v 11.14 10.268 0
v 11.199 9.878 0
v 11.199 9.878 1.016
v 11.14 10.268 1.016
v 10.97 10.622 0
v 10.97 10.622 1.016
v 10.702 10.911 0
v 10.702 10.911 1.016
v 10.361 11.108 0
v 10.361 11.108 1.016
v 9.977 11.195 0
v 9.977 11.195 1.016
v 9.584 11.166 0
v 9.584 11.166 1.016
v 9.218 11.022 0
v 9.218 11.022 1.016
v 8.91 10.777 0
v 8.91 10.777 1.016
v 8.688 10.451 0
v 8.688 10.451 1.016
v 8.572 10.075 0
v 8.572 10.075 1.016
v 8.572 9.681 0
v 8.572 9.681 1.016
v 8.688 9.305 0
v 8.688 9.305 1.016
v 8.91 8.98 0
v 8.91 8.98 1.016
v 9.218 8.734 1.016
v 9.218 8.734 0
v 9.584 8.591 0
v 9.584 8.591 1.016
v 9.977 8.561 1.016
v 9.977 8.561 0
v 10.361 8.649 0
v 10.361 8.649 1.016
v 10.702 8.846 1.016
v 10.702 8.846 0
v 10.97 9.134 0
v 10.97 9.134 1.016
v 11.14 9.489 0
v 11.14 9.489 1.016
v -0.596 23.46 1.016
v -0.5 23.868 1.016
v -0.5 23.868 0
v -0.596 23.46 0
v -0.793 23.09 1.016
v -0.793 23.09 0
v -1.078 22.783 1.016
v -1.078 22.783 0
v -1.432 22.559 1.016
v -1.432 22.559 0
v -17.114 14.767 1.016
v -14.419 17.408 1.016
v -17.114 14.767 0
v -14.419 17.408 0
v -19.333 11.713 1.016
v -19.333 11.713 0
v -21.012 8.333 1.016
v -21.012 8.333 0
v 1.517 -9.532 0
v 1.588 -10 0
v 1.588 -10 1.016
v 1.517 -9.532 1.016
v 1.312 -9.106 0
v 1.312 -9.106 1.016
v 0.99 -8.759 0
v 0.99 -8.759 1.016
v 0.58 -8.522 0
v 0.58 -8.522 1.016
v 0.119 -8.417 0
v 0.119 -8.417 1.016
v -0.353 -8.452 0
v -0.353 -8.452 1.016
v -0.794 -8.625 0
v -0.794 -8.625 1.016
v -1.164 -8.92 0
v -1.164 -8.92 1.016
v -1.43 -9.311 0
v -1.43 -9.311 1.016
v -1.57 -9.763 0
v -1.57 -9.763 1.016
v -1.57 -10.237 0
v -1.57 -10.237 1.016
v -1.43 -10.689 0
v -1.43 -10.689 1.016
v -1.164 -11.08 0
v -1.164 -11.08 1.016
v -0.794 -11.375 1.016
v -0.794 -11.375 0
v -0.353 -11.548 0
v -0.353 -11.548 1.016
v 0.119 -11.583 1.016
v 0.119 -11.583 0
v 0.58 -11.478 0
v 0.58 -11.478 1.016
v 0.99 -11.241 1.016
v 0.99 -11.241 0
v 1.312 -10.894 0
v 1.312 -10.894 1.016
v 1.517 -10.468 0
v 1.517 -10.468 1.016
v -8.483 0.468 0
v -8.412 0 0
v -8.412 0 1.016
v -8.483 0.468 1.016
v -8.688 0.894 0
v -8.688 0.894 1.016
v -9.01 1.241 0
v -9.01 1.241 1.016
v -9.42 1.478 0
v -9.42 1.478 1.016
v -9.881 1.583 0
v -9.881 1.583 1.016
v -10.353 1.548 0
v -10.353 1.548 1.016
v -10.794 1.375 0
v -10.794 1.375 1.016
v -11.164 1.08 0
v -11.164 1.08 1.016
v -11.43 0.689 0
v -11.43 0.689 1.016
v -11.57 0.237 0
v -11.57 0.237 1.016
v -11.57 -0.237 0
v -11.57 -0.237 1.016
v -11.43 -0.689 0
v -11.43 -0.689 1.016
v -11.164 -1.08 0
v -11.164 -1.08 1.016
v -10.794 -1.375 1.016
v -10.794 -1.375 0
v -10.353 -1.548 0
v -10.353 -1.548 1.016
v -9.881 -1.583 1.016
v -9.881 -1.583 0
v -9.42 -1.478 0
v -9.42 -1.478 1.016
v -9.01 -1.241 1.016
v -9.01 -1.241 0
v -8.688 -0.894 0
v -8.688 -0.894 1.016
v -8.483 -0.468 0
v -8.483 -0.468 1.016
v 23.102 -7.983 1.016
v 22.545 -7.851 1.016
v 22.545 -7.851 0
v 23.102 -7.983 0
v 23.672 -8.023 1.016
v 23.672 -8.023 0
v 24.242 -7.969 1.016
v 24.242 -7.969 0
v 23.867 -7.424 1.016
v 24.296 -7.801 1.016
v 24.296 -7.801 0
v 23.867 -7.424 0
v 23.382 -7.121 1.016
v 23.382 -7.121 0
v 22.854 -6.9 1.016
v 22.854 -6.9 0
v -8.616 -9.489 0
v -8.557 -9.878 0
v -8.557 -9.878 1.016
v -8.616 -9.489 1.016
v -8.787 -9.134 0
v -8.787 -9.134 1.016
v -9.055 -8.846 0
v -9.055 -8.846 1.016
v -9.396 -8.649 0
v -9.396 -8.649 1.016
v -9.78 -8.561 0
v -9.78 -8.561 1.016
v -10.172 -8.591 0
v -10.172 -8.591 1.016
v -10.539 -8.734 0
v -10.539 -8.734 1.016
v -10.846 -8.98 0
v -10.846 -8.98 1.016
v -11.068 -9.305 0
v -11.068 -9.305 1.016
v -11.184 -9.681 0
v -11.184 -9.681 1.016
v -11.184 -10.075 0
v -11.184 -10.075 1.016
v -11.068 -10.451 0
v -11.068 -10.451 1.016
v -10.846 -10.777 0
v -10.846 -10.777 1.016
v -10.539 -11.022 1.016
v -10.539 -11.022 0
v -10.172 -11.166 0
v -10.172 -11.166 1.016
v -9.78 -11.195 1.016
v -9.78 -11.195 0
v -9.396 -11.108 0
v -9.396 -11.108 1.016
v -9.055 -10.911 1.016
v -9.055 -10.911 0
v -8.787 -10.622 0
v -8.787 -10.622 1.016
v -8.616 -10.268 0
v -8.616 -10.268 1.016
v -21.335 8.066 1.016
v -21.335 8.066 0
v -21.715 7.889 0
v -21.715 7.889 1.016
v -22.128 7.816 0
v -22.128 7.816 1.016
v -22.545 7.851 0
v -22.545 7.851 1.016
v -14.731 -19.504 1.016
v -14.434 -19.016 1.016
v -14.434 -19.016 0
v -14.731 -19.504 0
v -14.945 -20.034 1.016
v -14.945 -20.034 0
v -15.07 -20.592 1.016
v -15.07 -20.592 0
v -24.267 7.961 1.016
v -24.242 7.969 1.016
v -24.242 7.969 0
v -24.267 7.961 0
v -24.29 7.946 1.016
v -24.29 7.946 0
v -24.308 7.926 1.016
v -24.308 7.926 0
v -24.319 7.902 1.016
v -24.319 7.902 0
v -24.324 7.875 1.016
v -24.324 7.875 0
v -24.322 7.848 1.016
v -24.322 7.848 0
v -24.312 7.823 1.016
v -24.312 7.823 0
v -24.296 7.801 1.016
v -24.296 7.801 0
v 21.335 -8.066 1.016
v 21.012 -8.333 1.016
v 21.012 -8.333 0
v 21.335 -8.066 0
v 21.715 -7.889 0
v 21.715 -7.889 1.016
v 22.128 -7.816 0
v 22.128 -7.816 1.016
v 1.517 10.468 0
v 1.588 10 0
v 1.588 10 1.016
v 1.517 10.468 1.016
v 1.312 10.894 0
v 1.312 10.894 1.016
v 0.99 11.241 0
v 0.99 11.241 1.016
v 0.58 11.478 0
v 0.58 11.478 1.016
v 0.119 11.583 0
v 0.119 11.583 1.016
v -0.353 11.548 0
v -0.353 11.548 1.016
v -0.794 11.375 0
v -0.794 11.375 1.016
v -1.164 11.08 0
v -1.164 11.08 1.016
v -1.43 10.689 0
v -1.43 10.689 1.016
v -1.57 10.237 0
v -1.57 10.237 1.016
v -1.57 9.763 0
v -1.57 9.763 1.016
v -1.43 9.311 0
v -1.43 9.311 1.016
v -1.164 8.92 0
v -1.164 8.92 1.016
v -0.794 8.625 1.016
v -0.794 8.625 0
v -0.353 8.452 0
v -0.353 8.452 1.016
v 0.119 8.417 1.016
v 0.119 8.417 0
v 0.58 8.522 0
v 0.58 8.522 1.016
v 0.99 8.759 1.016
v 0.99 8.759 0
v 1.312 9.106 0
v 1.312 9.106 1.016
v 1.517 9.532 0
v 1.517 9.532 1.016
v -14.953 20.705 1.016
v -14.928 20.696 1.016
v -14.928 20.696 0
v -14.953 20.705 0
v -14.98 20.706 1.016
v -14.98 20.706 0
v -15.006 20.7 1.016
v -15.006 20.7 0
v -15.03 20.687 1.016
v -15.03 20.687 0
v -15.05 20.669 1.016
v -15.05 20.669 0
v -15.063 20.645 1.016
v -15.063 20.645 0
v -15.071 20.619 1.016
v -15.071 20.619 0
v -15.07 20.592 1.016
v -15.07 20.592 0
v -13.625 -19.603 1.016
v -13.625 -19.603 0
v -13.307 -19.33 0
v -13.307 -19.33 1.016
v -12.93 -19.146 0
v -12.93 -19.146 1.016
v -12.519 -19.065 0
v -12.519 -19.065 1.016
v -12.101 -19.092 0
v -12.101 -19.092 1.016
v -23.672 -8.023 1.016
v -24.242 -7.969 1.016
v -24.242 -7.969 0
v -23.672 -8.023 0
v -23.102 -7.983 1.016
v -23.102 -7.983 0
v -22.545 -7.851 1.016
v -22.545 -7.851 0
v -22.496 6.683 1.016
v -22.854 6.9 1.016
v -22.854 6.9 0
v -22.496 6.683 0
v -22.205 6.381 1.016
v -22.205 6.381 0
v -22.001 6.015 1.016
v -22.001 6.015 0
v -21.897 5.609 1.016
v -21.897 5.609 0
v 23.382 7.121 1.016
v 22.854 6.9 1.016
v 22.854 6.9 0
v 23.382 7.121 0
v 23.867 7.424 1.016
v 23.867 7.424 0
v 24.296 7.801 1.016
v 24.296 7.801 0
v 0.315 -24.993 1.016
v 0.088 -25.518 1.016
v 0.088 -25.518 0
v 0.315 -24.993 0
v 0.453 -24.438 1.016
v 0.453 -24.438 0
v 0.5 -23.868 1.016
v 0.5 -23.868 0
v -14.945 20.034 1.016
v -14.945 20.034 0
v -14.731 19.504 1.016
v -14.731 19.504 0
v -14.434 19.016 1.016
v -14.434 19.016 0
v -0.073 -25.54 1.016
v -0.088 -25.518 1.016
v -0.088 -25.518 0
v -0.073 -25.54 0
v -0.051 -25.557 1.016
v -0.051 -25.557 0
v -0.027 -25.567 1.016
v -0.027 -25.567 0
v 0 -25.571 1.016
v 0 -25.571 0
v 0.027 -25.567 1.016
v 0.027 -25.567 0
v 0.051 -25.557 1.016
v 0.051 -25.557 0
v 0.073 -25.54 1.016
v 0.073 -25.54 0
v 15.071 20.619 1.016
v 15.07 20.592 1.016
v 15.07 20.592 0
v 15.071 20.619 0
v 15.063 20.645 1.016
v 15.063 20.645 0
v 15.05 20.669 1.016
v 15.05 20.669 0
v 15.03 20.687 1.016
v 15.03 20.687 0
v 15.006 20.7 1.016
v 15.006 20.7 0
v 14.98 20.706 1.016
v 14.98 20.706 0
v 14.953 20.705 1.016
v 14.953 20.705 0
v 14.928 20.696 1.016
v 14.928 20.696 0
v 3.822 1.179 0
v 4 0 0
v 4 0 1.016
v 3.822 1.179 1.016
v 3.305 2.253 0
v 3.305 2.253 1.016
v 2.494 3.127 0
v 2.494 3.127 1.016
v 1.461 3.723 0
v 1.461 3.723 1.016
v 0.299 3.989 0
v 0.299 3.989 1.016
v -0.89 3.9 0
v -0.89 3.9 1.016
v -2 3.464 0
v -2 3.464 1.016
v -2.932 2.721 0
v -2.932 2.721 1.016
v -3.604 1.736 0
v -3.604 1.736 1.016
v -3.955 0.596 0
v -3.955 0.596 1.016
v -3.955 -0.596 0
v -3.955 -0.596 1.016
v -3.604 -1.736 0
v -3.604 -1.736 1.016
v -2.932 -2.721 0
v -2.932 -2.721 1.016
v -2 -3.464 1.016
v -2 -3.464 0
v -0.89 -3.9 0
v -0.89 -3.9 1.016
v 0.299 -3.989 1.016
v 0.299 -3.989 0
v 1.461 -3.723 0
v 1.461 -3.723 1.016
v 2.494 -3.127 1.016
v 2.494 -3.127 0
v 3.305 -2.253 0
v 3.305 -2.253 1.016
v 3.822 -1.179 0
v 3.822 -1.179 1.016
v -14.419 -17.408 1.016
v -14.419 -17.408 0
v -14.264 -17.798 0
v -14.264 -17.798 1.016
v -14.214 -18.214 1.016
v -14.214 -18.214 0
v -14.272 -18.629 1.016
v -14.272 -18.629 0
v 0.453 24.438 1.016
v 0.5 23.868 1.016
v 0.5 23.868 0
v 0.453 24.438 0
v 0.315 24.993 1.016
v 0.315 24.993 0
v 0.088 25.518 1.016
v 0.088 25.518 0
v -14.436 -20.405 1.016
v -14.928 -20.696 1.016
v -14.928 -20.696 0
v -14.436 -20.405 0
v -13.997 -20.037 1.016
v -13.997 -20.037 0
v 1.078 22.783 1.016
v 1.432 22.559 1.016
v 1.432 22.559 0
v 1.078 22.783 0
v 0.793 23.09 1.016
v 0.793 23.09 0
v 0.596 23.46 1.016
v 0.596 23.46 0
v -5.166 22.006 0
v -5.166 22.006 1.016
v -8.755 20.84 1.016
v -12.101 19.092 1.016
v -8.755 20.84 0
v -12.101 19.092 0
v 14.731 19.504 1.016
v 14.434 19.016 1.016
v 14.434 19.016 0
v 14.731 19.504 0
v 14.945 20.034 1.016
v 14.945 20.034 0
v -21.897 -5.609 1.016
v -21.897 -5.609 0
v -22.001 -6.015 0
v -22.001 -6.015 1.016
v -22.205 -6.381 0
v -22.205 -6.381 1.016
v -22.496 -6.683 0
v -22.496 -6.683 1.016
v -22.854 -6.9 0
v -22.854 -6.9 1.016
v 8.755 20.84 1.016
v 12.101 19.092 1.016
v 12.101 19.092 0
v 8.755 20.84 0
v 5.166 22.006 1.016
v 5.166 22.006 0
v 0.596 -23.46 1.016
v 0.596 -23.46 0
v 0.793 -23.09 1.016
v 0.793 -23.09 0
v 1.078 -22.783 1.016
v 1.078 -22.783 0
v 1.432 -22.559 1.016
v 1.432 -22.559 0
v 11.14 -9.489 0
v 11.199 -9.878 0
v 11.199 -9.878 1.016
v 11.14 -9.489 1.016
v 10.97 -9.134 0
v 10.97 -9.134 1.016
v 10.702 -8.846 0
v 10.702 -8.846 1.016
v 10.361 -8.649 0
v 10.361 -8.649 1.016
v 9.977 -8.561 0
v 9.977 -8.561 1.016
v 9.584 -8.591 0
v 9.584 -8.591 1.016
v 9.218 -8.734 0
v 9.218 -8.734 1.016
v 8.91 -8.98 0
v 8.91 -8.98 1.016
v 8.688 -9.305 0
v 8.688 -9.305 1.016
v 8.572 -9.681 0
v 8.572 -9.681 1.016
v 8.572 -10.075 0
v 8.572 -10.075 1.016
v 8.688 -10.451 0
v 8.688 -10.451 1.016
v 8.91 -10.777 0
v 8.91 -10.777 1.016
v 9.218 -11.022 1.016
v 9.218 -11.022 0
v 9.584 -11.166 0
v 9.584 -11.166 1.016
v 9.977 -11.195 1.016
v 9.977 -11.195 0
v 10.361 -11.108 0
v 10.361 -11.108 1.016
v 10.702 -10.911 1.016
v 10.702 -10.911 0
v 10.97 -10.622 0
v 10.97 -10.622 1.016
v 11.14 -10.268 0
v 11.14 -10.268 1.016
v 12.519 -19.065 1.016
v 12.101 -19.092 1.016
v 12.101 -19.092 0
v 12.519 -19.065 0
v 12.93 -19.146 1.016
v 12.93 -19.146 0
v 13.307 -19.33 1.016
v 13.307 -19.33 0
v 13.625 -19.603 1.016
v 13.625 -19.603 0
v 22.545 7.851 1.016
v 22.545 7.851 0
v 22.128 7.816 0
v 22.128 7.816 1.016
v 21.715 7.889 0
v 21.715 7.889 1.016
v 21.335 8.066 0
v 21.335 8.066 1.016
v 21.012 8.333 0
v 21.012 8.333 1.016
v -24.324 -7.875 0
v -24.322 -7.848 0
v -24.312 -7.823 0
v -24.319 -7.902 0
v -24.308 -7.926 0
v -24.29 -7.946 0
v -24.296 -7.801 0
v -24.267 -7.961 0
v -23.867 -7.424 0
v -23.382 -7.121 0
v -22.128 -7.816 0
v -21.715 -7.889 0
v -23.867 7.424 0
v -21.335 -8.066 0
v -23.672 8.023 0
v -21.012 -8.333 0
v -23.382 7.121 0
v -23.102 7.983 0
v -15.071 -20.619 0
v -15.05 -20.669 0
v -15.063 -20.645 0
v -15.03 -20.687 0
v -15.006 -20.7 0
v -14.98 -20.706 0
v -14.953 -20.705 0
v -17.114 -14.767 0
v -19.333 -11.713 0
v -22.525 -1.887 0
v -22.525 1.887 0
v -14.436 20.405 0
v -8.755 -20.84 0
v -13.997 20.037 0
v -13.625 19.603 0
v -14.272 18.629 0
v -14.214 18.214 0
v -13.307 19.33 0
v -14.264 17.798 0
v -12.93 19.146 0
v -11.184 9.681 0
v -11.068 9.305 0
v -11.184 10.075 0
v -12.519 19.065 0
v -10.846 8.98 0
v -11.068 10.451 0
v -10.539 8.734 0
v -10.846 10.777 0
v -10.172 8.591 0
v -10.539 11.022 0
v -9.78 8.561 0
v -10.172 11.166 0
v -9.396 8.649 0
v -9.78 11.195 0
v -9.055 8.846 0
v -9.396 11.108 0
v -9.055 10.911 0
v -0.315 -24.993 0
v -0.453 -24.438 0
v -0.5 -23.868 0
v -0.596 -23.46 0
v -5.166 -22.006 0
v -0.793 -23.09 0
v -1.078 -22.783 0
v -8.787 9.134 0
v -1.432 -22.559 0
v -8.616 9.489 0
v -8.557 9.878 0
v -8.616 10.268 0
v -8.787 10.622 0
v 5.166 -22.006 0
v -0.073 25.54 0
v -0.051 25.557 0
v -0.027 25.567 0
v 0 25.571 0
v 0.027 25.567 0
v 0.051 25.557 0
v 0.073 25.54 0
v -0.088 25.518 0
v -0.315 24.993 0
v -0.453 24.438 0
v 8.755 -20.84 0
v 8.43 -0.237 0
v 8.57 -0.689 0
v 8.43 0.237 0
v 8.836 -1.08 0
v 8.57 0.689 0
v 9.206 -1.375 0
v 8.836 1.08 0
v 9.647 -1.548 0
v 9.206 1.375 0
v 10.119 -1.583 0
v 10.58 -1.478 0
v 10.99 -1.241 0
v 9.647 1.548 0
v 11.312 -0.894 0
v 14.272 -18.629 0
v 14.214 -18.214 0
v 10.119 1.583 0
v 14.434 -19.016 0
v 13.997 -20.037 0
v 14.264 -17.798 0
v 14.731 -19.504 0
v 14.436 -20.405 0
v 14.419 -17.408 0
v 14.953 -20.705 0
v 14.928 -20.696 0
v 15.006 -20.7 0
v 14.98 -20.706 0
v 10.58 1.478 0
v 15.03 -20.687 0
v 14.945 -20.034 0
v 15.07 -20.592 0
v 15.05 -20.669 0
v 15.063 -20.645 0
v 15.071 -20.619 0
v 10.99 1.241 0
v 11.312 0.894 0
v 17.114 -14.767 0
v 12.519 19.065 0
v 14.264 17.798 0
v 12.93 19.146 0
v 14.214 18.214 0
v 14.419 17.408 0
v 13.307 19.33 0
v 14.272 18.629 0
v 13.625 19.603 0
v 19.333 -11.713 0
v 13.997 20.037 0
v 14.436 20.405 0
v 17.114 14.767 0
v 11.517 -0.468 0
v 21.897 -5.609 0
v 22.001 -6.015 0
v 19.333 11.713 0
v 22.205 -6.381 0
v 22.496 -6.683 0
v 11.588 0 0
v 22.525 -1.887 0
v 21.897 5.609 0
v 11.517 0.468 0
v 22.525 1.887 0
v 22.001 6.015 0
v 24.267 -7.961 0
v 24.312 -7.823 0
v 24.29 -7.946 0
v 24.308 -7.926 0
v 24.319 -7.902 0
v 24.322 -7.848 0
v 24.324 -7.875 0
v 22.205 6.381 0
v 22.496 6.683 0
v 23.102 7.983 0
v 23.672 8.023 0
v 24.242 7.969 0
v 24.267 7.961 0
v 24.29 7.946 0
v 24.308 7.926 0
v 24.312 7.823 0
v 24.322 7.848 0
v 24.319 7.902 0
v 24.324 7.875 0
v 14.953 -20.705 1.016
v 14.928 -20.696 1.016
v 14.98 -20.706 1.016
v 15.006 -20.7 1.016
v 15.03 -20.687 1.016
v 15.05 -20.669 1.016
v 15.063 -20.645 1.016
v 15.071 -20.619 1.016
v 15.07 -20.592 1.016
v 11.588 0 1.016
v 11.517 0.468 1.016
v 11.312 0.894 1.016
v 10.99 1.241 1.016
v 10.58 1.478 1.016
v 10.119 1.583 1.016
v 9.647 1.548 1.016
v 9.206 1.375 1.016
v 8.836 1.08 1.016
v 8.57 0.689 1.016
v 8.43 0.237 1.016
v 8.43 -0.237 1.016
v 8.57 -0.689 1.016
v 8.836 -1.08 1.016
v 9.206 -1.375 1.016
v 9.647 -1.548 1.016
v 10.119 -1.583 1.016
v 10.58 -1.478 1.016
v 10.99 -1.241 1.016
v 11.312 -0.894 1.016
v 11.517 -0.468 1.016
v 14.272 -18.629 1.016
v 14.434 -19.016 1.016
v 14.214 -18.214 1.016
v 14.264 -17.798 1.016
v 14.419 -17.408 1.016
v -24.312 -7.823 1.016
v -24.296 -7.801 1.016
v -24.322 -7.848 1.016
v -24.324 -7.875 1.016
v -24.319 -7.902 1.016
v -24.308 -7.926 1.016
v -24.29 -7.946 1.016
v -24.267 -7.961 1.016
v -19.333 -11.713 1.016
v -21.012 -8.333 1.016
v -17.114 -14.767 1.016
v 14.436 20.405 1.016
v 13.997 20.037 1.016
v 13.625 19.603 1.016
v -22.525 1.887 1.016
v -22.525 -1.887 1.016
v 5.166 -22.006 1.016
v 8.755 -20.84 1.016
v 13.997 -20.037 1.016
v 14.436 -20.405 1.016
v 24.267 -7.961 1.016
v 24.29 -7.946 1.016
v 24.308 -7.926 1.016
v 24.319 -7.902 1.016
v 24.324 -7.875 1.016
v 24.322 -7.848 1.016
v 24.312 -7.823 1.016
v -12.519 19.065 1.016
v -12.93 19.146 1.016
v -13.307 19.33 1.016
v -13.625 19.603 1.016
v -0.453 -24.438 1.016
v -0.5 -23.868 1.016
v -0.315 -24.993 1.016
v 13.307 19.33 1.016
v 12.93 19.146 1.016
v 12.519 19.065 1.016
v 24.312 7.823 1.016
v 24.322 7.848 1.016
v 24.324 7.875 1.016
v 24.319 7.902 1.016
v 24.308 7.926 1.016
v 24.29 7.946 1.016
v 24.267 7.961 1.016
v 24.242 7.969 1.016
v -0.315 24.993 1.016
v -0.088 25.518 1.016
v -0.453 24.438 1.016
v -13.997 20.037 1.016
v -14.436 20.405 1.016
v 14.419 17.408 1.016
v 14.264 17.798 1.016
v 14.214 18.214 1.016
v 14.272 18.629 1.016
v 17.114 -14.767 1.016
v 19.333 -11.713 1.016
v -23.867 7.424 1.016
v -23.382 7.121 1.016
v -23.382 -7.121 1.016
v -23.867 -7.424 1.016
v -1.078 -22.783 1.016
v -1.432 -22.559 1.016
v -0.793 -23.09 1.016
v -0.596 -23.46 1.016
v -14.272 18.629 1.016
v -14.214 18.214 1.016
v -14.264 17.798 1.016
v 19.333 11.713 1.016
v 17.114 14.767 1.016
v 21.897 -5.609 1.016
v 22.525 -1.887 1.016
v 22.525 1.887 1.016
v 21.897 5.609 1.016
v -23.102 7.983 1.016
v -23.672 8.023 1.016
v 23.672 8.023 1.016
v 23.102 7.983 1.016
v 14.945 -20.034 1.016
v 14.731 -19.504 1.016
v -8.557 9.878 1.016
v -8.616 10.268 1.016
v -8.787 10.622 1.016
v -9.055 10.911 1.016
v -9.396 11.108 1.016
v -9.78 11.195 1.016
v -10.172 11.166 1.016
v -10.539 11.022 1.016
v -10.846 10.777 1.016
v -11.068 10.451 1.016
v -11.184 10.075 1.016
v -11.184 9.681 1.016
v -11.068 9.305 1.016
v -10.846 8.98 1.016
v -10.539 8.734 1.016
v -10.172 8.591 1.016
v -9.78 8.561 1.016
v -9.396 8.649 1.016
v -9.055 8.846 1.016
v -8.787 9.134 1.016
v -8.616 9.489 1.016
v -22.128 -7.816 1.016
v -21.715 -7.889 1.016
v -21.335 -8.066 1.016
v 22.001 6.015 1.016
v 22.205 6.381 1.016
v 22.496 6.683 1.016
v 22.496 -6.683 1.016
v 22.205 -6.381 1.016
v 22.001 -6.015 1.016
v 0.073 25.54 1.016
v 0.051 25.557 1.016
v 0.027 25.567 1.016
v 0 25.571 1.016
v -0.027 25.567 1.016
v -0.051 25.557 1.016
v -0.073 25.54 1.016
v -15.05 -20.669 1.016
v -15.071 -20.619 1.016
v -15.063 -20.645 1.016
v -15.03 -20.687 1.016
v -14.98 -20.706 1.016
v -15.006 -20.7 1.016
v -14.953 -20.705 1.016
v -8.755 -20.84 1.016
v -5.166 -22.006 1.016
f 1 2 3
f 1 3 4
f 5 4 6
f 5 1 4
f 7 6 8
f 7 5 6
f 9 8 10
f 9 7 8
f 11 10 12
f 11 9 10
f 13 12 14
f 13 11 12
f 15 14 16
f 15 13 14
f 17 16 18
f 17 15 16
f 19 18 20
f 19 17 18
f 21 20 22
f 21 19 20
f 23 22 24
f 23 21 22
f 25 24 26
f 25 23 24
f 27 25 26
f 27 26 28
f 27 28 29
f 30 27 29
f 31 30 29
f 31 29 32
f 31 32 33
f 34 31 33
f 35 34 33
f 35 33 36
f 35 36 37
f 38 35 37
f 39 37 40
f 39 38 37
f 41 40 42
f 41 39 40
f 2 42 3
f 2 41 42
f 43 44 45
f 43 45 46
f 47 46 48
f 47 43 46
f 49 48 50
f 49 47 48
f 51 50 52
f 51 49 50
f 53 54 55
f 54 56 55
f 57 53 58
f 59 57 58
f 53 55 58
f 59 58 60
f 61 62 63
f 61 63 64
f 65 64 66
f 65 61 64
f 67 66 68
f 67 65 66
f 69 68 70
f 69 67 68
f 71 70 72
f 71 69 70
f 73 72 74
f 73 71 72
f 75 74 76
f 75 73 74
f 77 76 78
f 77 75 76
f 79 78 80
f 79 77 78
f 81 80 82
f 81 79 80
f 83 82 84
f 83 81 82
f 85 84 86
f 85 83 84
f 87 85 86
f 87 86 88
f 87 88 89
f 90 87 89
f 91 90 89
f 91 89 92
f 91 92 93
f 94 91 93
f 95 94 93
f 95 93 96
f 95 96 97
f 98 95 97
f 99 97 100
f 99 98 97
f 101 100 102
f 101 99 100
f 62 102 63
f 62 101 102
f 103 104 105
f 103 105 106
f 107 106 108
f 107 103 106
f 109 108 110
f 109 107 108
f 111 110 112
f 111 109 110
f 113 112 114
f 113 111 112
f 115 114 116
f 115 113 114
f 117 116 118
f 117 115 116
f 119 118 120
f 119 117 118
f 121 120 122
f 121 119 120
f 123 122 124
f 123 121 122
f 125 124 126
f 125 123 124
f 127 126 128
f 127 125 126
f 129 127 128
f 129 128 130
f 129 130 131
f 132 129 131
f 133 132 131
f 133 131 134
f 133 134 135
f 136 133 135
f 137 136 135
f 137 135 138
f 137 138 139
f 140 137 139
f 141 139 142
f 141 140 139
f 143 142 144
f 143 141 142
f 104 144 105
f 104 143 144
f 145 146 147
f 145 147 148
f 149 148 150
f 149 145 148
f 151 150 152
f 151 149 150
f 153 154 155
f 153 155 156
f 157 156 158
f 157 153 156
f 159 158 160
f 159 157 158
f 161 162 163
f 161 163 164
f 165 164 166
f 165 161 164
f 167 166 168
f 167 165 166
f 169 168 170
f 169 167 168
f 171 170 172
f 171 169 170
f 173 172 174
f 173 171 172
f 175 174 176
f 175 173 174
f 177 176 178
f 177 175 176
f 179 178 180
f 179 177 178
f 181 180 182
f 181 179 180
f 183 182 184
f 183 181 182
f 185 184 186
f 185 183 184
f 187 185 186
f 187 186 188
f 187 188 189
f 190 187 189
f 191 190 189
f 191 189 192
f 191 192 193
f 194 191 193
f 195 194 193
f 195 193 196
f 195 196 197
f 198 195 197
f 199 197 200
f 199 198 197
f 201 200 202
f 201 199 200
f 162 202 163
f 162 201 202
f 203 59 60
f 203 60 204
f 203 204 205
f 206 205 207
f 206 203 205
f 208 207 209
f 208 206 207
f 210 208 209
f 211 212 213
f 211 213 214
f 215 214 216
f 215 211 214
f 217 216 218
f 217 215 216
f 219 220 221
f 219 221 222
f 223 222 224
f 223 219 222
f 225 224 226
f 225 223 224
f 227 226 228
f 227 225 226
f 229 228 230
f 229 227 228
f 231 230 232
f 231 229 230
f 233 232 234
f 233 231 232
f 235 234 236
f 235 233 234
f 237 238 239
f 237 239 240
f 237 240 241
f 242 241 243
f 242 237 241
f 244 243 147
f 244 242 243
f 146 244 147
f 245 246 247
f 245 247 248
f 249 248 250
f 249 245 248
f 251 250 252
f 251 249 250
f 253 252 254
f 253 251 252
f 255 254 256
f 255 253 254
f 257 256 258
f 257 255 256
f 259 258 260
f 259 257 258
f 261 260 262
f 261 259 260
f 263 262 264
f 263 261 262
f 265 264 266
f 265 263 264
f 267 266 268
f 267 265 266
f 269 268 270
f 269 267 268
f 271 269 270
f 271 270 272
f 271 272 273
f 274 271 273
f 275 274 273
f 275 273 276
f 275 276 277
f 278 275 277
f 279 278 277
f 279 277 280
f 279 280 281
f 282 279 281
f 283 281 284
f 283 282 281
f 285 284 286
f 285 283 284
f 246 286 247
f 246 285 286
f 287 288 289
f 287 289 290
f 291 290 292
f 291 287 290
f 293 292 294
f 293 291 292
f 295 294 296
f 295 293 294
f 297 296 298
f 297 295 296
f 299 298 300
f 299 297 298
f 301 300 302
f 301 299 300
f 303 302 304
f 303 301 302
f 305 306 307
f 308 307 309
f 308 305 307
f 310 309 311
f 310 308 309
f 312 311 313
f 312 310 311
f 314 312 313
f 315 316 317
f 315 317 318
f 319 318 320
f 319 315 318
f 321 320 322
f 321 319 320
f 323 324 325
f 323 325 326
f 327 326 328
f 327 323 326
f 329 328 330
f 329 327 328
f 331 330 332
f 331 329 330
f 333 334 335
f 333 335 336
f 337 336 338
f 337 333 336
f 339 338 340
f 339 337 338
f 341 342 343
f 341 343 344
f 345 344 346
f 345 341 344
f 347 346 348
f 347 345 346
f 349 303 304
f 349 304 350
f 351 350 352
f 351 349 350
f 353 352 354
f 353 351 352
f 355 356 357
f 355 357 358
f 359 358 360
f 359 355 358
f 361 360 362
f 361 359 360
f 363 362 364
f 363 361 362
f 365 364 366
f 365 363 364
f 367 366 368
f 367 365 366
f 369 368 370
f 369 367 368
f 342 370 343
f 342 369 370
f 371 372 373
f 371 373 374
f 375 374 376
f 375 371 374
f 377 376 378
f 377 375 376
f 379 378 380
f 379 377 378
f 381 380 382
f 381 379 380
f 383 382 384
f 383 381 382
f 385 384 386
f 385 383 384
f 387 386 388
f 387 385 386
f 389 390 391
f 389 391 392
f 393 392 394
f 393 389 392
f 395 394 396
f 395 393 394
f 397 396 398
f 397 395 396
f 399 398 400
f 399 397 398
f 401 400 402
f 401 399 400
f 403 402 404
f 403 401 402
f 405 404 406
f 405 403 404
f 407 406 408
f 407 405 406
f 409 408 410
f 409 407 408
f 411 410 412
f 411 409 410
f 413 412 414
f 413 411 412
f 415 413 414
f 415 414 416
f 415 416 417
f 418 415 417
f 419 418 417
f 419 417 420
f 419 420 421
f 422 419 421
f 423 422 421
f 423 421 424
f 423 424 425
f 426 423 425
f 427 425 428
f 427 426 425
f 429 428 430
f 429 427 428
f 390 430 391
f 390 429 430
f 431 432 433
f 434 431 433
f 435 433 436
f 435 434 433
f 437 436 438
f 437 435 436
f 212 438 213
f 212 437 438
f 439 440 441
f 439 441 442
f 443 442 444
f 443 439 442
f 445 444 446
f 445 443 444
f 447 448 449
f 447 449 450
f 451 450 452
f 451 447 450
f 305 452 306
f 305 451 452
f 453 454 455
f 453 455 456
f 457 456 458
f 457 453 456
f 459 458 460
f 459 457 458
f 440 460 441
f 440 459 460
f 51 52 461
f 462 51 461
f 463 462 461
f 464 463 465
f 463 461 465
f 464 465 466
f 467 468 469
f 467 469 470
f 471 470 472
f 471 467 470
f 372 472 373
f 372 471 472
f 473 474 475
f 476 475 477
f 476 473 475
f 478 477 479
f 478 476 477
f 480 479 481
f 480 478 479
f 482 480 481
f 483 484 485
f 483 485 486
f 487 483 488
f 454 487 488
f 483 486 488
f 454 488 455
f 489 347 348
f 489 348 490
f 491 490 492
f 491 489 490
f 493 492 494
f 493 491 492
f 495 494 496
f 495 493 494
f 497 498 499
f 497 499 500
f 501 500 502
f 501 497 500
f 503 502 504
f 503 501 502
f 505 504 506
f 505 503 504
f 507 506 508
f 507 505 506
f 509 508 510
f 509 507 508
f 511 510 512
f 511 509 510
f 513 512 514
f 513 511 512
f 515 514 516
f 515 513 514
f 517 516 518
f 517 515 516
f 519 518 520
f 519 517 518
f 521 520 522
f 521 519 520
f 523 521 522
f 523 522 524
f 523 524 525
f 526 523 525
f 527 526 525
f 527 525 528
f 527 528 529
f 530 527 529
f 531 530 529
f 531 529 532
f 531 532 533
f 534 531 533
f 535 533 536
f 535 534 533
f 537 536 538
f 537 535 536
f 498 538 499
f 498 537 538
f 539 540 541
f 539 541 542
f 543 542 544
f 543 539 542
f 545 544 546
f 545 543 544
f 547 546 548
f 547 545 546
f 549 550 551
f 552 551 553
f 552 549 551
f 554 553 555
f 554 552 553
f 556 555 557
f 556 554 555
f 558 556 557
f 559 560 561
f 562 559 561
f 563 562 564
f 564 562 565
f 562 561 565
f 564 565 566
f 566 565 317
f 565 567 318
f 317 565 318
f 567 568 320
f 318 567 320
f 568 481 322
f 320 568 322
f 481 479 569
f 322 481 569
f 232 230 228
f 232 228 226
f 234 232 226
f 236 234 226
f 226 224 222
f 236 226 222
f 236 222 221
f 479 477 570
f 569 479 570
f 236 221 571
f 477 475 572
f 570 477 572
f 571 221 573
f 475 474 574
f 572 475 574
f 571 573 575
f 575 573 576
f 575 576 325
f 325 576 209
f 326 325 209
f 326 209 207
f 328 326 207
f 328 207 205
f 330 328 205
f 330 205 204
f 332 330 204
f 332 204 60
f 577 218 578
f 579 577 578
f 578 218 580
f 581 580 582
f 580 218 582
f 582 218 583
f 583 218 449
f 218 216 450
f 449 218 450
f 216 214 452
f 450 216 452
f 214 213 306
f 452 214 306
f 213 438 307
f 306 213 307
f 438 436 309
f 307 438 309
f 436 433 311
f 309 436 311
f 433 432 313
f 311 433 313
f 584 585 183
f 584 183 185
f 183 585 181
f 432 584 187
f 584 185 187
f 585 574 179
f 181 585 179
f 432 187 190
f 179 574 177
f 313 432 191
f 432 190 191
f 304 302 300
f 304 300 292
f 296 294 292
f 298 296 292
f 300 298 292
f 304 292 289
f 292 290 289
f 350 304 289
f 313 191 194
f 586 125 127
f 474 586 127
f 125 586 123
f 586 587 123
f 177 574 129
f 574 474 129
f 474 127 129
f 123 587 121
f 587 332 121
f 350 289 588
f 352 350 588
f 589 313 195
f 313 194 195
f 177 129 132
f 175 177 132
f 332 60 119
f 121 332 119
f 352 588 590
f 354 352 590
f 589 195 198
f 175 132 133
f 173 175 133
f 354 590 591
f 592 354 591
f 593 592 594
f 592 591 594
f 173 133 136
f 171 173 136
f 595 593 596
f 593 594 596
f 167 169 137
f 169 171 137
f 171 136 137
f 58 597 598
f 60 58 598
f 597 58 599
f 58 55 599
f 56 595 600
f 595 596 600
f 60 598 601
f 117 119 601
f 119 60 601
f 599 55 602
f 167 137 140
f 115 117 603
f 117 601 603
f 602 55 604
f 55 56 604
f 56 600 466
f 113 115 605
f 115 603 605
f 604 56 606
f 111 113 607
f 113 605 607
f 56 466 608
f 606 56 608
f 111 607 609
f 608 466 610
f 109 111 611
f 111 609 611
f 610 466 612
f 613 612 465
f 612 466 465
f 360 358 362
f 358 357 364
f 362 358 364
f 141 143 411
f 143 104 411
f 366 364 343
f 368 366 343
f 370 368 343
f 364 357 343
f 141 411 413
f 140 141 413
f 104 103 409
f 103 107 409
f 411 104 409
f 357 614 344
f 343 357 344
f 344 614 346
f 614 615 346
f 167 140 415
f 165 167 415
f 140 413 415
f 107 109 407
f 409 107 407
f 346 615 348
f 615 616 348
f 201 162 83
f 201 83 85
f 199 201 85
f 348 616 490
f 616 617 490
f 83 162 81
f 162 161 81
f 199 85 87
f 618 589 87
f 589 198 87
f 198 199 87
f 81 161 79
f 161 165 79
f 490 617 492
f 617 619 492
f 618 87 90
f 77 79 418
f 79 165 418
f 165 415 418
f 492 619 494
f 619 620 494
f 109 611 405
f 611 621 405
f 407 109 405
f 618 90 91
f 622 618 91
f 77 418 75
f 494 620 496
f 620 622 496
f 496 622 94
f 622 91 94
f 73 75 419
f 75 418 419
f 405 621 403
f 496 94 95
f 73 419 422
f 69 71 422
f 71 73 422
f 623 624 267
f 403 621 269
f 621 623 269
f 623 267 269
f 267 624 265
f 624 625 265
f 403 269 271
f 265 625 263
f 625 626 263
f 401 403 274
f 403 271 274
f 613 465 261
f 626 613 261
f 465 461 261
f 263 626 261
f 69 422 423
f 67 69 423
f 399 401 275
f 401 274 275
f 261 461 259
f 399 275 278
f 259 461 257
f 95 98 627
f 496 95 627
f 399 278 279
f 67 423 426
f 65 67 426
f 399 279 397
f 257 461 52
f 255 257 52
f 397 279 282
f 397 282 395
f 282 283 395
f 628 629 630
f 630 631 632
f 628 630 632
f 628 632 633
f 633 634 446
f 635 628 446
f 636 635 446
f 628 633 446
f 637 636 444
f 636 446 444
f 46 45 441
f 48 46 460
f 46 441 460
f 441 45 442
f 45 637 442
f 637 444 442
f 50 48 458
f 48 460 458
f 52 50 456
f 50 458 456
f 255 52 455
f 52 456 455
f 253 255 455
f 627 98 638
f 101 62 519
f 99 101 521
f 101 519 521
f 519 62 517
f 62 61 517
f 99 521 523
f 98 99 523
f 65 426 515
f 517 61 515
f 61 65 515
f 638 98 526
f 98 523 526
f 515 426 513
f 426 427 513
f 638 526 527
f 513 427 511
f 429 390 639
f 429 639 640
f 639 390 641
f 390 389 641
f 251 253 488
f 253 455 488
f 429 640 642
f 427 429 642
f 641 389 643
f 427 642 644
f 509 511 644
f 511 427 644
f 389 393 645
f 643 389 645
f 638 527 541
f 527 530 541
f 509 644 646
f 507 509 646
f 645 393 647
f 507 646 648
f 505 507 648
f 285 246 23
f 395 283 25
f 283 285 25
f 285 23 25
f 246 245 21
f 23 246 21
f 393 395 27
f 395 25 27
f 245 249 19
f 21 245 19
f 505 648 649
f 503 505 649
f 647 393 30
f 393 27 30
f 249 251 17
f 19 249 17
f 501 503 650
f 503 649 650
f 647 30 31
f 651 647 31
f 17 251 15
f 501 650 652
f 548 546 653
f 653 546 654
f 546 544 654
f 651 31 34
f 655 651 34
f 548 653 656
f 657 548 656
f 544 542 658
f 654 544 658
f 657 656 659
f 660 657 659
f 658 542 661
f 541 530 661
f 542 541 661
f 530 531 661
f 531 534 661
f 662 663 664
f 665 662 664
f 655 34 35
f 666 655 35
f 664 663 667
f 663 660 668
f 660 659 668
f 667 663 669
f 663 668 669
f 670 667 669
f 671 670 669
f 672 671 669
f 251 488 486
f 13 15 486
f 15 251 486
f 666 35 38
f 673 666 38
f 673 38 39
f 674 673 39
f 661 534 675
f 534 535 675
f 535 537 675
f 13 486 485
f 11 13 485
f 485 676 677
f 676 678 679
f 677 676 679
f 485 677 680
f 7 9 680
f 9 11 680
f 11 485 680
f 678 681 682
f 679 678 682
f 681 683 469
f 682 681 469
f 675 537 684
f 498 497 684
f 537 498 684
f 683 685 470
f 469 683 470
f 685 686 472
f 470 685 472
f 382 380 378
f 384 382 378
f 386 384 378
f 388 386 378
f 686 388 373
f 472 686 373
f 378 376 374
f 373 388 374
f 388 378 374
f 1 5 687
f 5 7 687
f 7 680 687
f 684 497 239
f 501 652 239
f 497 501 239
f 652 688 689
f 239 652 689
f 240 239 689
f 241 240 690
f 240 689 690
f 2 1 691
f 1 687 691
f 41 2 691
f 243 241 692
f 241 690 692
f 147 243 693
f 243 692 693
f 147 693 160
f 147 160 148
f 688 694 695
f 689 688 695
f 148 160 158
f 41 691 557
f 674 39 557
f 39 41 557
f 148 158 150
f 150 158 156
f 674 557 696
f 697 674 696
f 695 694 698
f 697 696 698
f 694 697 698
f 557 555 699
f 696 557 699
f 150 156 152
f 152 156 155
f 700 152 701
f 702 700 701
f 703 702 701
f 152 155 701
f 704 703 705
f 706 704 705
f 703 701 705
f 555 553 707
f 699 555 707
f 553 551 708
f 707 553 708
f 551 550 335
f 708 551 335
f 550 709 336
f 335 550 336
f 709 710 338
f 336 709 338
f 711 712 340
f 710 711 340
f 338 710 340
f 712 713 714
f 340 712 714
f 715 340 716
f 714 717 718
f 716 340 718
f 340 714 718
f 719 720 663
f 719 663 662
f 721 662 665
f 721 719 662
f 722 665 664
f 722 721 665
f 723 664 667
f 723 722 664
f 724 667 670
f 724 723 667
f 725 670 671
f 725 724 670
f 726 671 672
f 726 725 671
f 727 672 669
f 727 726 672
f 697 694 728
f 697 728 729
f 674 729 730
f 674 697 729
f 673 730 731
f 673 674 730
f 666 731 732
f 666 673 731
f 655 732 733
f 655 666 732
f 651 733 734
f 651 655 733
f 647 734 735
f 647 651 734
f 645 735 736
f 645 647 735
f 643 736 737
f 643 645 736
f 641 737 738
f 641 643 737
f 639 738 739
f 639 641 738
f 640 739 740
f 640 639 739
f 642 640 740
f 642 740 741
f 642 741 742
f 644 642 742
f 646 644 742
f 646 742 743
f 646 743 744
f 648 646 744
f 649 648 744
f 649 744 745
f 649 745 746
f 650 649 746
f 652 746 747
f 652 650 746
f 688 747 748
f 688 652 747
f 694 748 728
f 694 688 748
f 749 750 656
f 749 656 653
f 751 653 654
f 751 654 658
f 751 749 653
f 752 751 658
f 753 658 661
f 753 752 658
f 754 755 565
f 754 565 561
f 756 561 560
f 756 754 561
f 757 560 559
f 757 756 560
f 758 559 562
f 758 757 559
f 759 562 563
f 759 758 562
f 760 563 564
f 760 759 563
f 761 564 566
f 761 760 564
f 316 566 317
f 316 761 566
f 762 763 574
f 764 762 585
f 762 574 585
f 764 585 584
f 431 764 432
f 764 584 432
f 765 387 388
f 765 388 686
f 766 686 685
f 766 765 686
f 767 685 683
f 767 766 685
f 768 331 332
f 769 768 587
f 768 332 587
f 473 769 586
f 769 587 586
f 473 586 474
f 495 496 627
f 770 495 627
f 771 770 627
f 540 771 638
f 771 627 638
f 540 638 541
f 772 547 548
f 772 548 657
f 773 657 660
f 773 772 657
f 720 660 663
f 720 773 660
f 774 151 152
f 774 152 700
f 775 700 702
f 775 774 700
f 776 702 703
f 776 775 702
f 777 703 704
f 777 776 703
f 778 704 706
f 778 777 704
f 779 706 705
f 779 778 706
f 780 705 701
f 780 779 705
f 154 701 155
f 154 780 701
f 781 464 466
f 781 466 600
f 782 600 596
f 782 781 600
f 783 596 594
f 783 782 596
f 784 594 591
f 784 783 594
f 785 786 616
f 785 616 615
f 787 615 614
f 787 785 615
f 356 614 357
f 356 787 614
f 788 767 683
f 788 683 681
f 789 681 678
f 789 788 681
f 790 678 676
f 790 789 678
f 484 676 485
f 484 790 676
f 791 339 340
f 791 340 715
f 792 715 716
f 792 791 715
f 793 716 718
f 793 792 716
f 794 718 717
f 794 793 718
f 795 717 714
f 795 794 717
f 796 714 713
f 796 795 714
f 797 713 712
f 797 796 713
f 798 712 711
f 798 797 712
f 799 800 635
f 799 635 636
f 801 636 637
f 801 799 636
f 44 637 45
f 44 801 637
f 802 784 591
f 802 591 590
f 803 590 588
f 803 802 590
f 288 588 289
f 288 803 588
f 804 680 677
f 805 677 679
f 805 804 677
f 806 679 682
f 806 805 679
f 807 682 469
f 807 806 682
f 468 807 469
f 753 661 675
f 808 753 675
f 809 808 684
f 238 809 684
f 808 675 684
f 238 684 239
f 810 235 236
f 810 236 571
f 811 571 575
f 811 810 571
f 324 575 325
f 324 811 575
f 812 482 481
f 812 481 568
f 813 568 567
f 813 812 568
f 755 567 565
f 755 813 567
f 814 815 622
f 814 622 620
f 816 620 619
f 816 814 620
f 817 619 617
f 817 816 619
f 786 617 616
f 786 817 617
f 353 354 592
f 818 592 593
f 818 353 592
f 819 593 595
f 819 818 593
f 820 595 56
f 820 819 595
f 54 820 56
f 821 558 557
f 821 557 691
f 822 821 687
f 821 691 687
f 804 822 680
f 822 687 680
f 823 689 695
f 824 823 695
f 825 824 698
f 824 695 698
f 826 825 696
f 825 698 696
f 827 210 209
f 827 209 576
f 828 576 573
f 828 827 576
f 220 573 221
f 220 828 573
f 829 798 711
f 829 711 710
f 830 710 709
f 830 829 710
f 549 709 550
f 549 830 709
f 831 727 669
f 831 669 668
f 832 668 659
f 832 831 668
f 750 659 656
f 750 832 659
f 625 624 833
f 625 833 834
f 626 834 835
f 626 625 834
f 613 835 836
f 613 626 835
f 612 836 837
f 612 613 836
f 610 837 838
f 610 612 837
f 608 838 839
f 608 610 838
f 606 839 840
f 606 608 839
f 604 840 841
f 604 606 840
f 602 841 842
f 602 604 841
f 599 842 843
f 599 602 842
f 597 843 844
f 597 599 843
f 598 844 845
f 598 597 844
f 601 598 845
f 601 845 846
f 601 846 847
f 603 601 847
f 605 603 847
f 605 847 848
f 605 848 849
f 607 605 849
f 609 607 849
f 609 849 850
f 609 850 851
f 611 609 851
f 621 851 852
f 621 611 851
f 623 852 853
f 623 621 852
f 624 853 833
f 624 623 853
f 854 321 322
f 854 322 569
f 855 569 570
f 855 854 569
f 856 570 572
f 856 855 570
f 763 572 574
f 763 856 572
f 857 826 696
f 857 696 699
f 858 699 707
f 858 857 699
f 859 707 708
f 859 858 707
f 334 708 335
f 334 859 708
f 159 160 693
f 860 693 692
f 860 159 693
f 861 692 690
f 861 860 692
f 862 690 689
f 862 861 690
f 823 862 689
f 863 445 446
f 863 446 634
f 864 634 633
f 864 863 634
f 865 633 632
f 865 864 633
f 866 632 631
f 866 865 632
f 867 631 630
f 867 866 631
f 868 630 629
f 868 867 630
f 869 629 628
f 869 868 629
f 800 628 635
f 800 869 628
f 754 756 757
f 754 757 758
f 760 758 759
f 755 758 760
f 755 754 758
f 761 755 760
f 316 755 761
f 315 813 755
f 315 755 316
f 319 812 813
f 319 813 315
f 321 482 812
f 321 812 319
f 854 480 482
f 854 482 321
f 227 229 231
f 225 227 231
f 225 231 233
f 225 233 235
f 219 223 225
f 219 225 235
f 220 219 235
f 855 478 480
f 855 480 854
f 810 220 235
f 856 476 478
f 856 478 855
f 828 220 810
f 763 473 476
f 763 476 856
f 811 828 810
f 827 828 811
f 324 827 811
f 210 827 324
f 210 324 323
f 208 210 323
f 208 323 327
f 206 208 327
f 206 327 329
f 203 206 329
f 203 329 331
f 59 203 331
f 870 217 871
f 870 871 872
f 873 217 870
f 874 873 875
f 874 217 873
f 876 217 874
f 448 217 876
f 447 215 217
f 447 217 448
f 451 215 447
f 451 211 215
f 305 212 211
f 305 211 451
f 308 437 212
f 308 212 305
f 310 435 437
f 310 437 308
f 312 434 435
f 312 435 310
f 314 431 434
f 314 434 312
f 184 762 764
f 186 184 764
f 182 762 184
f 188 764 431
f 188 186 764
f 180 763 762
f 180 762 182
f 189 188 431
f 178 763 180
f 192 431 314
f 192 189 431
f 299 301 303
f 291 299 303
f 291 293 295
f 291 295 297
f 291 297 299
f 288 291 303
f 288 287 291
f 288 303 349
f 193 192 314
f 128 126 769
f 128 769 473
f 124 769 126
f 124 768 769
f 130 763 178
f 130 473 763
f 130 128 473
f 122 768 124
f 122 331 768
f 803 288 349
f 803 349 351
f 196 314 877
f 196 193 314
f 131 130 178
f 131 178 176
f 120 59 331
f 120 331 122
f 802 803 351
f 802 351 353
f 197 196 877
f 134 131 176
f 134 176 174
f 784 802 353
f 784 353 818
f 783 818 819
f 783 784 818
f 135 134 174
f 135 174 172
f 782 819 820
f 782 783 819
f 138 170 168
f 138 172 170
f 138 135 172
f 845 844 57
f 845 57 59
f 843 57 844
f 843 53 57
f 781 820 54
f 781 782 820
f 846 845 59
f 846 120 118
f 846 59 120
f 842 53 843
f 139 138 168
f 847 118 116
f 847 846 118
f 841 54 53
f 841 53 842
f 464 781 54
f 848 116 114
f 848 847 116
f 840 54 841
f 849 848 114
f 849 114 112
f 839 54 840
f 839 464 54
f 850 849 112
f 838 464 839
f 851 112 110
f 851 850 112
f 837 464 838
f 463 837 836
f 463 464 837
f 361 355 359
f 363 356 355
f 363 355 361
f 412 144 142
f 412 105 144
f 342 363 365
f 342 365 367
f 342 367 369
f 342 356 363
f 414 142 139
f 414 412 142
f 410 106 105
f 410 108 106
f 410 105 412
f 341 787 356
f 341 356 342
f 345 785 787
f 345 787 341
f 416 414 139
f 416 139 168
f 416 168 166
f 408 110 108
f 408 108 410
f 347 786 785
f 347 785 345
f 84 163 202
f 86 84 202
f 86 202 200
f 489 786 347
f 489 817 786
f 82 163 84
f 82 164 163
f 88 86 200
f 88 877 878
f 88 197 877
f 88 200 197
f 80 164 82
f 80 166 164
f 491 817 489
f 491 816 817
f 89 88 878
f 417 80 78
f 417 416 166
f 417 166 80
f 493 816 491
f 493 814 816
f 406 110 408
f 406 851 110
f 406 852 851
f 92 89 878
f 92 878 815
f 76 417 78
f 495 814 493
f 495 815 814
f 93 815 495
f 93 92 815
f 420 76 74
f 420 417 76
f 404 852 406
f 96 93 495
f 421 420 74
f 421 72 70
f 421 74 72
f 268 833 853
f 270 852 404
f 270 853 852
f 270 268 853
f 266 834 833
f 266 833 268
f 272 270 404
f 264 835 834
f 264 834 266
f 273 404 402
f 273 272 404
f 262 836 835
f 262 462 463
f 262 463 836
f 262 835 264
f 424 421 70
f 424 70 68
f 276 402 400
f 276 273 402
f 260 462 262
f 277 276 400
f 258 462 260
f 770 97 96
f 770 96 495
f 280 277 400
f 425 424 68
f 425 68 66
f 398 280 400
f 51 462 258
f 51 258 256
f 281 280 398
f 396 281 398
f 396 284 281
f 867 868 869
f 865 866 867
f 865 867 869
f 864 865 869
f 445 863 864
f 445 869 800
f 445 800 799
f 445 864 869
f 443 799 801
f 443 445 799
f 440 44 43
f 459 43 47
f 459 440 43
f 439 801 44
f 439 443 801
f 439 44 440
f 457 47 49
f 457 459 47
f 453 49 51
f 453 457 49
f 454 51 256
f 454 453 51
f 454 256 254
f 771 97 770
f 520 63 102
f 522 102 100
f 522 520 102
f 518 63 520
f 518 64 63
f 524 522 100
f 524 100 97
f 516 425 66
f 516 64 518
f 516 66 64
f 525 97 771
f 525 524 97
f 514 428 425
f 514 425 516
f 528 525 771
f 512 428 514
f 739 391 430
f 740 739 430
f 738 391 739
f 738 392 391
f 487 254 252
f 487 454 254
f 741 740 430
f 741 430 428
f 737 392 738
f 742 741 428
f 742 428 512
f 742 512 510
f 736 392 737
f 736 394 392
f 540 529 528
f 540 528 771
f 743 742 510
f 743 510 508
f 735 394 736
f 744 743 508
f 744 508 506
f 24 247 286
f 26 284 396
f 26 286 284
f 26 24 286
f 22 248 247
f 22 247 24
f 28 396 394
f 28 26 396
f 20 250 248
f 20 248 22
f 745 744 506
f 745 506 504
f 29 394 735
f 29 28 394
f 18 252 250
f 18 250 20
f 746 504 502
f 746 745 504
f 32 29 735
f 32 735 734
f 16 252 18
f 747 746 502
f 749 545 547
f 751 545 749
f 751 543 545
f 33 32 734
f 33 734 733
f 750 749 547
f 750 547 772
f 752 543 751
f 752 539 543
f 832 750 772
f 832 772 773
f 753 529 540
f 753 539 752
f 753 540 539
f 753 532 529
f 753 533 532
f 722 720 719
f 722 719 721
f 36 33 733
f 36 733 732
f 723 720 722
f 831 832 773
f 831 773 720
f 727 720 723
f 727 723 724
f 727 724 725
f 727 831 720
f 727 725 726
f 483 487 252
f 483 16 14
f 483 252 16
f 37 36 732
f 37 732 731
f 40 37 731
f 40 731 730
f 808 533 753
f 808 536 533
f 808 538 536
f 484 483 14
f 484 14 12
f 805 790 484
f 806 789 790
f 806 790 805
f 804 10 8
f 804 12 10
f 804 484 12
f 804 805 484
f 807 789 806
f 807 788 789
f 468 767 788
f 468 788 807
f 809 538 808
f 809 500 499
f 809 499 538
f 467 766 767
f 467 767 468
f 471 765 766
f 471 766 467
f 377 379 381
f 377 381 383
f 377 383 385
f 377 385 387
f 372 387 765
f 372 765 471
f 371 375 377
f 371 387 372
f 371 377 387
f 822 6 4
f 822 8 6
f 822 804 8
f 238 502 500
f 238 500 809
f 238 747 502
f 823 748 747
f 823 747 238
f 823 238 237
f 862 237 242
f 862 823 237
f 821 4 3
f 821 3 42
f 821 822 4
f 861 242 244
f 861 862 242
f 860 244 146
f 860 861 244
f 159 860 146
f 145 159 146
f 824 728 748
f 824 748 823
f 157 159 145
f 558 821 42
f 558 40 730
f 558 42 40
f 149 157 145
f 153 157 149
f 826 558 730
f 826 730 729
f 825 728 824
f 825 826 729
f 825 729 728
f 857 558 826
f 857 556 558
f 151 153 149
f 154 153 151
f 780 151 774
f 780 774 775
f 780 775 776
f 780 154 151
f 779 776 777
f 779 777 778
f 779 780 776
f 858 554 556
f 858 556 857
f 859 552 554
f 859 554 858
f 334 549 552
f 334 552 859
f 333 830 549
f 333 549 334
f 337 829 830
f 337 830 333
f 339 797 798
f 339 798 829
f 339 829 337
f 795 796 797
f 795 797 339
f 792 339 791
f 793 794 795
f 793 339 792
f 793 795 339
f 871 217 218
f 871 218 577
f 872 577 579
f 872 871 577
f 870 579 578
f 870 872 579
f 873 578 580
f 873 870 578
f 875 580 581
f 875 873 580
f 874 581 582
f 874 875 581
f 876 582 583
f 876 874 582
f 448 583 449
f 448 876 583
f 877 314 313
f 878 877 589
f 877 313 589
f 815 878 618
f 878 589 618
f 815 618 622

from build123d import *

# Parameters (mm, degrees)
SKETCH1_R           = 22.6042
SKETCH1_R_2         = 1.5875
SKETCH1_R_3         = 1.3208
SKETCH1_R_4         = 4
BOSS_EXTRUDE2_DEPTH = 1.016
BOSS_EXTRUDE4_DEPTH = 1.016
CIRPATTERN1_COUNT   = 10


with BuildPart() as part:
    # Sketch1 → Boss-Extrude2 (new body)
    with BuildSketch(Plane.XY):
        Circle(SKETCH1_R)
        with Locations((0, 10)):
            Circle(SKETCH1_R_2, mode=Mode.SUBTRACT)
        with Locations((9.878281733, -9.878281733)):
            Circle(SKETCH1_R_3, mode=Mode.SUBTRACT)
        with Locations((9.878281733, 9.878281733)):
            Circle(SKETCH1_R_3, mode=Mode.SUBTRACT)
        with Locations((-9.878281733, -9.878281733)):
            Circle(SKETCH1_R_3, mode=Mode.SUBTRACT)
        with Locations((-9.878281733, 9.878281733)):
            Circle(SKETCH1_R_3, mode=Mode.SUBTRACT)
        Circle(SKETCH1_R_4, mode=Mode.SUBTRACT)
        with Locations((10, 0)):
            Circle(SKETCH1_R_2, mode=Mode.SUBTRACT)
        with Locations((0, -10)):
            Circle(SKETCH1_R_2, mode=Mode.SUBTRACT)
        with Locations((-10, 0)):
            Circle(SKETCH1_R_2, mode=Mode.SUBTRACT)
    extrude(amount=BOSS_EXTRUDE2_DEPTH)

    # Sketch2 → Boss-Extrude4 (add)
    with BuildSketch(Plane.XY.offset(1.016)):
        with BuildLine():
            ThreePointArc((0.499966183, 23.867964213), (0.39548978, 24.71817963), (0.088277099, 25.517805758))
            ThreePointArc((0.088277099, 25.517805758), (2.11e-07, 25.570824608), (-0.088276453, 25.517805384))
            ThreePointArc((-0.088276453, 25.517805384), (-0.395485603, 24.718178984), (-0.499958974, 23.867964213))
            ThreePointArc((-0.499958974, 23.867964213), (-0.860359014, 23.002073844), (-1.63911586, 22.479396033))
            ThreePointArc((-1.63911586, 22.479396033), (3.604e-06, 22.249732232), (1.639123068, 22.479396033))
            ThreePointArc((1.639123068, 22.479396033), (0.860366222, 23.002073844), (0.499966183, 23.867964213))
        make_face()
    boss_extrude4 = extrude(amount=-BOSS_EXTRUDE4_DEPTH)

    # CirPattern1: Boss-Extrude4 ×10 about axis
    cirpattern1_axis = Axis((0, 0, 0), (0, 0, 1))
    for i in range(1, CIRPATTERN1_COUNT):
        add(boss_extrude4.rotate(cirpattern1_axis, i * 360 / CIRPATTERN1_COUNT))


solid = part.part
